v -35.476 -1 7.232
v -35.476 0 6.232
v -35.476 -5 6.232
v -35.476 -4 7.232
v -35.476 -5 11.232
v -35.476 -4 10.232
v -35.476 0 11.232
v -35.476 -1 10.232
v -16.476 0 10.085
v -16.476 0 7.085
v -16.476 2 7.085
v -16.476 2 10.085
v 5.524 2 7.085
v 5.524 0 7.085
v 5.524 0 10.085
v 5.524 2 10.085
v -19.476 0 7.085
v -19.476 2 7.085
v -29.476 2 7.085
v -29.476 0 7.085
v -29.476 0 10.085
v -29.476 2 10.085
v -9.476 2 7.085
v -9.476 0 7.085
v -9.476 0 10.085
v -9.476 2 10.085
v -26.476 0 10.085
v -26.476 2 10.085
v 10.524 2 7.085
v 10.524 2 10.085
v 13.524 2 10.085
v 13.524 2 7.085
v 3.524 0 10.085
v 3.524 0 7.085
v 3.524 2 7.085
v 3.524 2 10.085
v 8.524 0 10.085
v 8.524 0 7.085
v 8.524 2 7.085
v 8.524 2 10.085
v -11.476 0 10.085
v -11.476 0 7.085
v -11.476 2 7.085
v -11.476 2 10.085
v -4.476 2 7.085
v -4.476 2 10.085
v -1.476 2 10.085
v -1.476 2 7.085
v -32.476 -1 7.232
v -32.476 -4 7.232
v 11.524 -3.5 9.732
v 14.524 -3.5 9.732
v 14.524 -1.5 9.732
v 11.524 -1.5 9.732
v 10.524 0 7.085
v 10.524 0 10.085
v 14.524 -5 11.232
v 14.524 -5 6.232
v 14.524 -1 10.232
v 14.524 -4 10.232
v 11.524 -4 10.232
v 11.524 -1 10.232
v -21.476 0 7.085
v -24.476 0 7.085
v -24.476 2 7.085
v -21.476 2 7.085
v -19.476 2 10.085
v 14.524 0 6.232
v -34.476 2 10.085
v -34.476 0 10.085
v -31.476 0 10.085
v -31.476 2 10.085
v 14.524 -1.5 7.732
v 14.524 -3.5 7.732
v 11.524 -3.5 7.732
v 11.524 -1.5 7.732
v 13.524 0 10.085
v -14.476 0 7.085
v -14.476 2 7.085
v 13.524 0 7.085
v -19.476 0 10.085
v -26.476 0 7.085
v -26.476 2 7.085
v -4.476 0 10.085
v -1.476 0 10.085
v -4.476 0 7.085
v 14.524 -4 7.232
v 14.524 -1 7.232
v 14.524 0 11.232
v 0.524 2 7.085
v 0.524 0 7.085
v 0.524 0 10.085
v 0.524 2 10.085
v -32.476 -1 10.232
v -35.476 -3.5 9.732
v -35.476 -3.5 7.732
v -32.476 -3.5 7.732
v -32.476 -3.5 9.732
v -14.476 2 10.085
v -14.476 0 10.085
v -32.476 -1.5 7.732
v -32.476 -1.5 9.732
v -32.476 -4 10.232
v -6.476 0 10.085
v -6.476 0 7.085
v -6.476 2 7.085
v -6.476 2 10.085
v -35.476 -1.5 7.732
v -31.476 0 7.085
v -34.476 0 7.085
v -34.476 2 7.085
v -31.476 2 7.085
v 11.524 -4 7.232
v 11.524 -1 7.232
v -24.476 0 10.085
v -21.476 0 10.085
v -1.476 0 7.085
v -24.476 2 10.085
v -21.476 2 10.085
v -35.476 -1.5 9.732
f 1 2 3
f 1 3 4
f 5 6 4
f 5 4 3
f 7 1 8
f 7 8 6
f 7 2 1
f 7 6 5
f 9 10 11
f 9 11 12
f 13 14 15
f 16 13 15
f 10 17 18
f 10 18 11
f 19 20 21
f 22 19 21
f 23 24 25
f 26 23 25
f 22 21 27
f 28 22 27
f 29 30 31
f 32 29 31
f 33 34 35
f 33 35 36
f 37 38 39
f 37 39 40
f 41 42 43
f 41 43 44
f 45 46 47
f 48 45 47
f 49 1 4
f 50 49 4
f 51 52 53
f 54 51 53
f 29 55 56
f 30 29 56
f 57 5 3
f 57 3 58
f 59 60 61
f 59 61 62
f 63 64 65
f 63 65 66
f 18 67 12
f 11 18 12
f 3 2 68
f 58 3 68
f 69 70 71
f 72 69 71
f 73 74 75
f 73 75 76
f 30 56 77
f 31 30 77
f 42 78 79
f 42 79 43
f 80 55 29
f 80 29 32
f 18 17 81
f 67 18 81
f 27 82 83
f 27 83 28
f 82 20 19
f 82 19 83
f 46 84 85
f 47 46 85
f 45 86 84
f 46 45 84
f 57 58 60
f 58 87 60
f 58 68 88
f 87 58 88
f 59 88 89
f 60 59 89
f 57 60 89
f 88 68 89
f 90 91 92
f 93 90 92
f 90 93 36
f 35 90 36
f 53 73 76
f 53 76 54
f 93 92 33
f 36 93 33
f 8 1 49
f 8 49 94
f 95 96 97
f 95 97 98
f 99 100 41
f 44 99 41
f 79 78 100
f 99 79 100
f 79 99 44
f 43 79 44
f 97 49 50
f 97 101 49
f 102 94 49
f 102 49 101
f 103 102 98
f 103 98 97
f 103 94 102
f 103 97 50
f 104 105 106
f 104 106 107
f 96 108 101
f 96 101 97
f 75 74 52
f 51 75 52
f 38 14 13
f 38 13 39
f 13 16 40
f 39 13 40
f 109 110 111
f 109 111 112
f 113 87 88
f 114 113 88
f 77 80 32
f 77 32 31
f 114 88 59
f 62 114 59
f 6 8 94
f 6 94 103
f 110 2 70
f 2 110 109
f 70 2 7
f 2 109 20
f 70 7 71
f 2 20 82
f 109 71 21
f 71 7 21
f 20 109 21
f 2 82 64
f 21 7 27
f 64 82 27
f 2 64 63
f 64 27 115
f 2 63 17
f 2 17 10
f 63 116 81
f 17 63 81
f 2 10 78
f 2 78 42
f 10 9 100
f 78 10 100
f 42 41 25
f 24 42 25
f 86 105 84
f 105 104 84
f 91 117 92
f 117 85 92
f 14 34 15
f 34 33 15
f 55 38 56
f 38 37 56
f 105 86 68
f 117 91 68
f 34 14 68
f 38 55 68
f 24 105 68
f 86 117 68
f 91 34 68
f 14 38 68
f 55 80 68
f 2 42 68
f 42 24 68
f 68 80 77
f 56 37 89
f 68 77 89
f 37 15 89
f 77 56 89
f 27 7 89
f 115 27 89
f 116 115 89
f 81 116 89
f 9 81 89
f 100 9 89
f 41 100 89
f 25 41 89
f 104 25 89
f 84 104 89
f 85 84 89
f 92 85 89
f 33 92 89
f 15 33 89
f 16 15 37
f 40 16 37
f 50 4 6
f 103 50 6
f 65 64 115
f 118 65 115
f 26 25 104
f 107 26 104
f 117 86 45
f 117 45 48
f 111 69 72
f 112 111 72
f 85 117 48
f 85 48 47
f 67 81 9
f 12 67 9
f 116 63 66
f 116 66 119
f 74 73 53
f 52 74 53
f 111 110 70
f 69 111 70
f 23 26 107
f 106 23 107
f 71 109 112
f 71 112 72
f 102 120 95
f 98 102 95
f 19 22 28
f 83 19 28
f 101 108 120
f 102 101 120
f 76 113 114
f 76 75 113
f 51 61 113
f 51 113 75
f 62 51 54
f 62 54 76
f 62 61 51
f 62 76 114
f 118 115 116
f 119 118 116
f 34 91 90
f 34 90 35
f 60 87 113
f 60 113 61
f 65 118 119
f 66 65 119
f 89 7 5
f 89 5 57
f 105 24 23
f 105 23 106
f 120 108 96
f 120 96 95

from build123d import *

# Parameters (mm, degrees)
F0_W     = 50
F0_H     = 5
F1_DEPTH = 5
F2_W     = 3
F2_H     = 3
F3_DEPTH = 2
F4_W     = 3
F4_H     = 3
F4_W_2   = 2
F4_H_2   = 2
F5_DEPTH = 3
F6_W     = 3
F6_H     = 3
F6_W_2   = 2
F6_H_2   = 2
F7_DEPTH = 3


with BuildPart() as f1:
    # F0 (on Front) → F1 (new body)
    with BuildSketch(Plane.XZ):
        with Locations((-10.476069, 8.731769)):
            Rectangle(F0_W, F0_H)
    extrude(amount=F1_DEPTH)

    # F2 (on Front) → F3 (join)
    with BuildSketch(Plane.XZ):
        with Locations((-32.976069, 8.585279)):
            Rectangle(F2_W, F2_H)
        with Locations((-27.976069, 8.585279)):
            Rectangle(F2_W, F2_H)
        with Locations((-22.976069, 8.585279)):
            Rectangle(F2_W, F2_H)
        with Locations((-17.976069, 8.585279)):
            Rectangle(F2_W, F2_H)
        with Locations((-12.976069, 8.585279)):
            Rectangle(F2_W, F2_H)
        with Locations((-7.976069, 8.585279)):
            Rectangle(F2_W, F2_H)
        with Locations((-2.976069, 8.585279)):
            Rectangle(F2_W, F2_H)
        with Locations((2.023931, 8.585279)):
            Rectangle(F2_W, F2_H)
        with Locations((7.023931, 8.585279)):
            Rectangle(F2_W, F2_H)
        with Locations((12.023931, 8.585279)):
            Rectangle(F2_W, F2_H)
    extrude(amount=-F3_DEPTH)

    # F4 (on face) → F5 (cut)
    with BuildSketch(Plane(origin=(-35.476069, 0, 0), x_dir=(0, -1, 0), z_dir=(-1, 0, 0))):
        with Locations((2.5, 8.731769)):
            Rectangle(F4_W, F4_H)
        with Locations((2.5, 8.731769)):
            Rectangle(F4_W_2, F4_H_2, mode=Mode.SUBTRACT)
    extrude(amount=-F5_DEPTH, mode=Mode.SUBTRACT)

    # F6 (on face) → F7 (cut)
    with BuildSketch(Plane.YZ.offset(14.523931)):
        with Locations((-2.5, 8.731769)):
            Rectangle(F6_W, F6_H)
        with Locations((-2.5, 8.731769)):
            Rectangle(F6_W_2, F6_H_2, mode=Mode.SUBTRACT)
    extrude(amount=-F7_DEPTH, mode=Mode.SUBTRACT)


solid = f1.part
